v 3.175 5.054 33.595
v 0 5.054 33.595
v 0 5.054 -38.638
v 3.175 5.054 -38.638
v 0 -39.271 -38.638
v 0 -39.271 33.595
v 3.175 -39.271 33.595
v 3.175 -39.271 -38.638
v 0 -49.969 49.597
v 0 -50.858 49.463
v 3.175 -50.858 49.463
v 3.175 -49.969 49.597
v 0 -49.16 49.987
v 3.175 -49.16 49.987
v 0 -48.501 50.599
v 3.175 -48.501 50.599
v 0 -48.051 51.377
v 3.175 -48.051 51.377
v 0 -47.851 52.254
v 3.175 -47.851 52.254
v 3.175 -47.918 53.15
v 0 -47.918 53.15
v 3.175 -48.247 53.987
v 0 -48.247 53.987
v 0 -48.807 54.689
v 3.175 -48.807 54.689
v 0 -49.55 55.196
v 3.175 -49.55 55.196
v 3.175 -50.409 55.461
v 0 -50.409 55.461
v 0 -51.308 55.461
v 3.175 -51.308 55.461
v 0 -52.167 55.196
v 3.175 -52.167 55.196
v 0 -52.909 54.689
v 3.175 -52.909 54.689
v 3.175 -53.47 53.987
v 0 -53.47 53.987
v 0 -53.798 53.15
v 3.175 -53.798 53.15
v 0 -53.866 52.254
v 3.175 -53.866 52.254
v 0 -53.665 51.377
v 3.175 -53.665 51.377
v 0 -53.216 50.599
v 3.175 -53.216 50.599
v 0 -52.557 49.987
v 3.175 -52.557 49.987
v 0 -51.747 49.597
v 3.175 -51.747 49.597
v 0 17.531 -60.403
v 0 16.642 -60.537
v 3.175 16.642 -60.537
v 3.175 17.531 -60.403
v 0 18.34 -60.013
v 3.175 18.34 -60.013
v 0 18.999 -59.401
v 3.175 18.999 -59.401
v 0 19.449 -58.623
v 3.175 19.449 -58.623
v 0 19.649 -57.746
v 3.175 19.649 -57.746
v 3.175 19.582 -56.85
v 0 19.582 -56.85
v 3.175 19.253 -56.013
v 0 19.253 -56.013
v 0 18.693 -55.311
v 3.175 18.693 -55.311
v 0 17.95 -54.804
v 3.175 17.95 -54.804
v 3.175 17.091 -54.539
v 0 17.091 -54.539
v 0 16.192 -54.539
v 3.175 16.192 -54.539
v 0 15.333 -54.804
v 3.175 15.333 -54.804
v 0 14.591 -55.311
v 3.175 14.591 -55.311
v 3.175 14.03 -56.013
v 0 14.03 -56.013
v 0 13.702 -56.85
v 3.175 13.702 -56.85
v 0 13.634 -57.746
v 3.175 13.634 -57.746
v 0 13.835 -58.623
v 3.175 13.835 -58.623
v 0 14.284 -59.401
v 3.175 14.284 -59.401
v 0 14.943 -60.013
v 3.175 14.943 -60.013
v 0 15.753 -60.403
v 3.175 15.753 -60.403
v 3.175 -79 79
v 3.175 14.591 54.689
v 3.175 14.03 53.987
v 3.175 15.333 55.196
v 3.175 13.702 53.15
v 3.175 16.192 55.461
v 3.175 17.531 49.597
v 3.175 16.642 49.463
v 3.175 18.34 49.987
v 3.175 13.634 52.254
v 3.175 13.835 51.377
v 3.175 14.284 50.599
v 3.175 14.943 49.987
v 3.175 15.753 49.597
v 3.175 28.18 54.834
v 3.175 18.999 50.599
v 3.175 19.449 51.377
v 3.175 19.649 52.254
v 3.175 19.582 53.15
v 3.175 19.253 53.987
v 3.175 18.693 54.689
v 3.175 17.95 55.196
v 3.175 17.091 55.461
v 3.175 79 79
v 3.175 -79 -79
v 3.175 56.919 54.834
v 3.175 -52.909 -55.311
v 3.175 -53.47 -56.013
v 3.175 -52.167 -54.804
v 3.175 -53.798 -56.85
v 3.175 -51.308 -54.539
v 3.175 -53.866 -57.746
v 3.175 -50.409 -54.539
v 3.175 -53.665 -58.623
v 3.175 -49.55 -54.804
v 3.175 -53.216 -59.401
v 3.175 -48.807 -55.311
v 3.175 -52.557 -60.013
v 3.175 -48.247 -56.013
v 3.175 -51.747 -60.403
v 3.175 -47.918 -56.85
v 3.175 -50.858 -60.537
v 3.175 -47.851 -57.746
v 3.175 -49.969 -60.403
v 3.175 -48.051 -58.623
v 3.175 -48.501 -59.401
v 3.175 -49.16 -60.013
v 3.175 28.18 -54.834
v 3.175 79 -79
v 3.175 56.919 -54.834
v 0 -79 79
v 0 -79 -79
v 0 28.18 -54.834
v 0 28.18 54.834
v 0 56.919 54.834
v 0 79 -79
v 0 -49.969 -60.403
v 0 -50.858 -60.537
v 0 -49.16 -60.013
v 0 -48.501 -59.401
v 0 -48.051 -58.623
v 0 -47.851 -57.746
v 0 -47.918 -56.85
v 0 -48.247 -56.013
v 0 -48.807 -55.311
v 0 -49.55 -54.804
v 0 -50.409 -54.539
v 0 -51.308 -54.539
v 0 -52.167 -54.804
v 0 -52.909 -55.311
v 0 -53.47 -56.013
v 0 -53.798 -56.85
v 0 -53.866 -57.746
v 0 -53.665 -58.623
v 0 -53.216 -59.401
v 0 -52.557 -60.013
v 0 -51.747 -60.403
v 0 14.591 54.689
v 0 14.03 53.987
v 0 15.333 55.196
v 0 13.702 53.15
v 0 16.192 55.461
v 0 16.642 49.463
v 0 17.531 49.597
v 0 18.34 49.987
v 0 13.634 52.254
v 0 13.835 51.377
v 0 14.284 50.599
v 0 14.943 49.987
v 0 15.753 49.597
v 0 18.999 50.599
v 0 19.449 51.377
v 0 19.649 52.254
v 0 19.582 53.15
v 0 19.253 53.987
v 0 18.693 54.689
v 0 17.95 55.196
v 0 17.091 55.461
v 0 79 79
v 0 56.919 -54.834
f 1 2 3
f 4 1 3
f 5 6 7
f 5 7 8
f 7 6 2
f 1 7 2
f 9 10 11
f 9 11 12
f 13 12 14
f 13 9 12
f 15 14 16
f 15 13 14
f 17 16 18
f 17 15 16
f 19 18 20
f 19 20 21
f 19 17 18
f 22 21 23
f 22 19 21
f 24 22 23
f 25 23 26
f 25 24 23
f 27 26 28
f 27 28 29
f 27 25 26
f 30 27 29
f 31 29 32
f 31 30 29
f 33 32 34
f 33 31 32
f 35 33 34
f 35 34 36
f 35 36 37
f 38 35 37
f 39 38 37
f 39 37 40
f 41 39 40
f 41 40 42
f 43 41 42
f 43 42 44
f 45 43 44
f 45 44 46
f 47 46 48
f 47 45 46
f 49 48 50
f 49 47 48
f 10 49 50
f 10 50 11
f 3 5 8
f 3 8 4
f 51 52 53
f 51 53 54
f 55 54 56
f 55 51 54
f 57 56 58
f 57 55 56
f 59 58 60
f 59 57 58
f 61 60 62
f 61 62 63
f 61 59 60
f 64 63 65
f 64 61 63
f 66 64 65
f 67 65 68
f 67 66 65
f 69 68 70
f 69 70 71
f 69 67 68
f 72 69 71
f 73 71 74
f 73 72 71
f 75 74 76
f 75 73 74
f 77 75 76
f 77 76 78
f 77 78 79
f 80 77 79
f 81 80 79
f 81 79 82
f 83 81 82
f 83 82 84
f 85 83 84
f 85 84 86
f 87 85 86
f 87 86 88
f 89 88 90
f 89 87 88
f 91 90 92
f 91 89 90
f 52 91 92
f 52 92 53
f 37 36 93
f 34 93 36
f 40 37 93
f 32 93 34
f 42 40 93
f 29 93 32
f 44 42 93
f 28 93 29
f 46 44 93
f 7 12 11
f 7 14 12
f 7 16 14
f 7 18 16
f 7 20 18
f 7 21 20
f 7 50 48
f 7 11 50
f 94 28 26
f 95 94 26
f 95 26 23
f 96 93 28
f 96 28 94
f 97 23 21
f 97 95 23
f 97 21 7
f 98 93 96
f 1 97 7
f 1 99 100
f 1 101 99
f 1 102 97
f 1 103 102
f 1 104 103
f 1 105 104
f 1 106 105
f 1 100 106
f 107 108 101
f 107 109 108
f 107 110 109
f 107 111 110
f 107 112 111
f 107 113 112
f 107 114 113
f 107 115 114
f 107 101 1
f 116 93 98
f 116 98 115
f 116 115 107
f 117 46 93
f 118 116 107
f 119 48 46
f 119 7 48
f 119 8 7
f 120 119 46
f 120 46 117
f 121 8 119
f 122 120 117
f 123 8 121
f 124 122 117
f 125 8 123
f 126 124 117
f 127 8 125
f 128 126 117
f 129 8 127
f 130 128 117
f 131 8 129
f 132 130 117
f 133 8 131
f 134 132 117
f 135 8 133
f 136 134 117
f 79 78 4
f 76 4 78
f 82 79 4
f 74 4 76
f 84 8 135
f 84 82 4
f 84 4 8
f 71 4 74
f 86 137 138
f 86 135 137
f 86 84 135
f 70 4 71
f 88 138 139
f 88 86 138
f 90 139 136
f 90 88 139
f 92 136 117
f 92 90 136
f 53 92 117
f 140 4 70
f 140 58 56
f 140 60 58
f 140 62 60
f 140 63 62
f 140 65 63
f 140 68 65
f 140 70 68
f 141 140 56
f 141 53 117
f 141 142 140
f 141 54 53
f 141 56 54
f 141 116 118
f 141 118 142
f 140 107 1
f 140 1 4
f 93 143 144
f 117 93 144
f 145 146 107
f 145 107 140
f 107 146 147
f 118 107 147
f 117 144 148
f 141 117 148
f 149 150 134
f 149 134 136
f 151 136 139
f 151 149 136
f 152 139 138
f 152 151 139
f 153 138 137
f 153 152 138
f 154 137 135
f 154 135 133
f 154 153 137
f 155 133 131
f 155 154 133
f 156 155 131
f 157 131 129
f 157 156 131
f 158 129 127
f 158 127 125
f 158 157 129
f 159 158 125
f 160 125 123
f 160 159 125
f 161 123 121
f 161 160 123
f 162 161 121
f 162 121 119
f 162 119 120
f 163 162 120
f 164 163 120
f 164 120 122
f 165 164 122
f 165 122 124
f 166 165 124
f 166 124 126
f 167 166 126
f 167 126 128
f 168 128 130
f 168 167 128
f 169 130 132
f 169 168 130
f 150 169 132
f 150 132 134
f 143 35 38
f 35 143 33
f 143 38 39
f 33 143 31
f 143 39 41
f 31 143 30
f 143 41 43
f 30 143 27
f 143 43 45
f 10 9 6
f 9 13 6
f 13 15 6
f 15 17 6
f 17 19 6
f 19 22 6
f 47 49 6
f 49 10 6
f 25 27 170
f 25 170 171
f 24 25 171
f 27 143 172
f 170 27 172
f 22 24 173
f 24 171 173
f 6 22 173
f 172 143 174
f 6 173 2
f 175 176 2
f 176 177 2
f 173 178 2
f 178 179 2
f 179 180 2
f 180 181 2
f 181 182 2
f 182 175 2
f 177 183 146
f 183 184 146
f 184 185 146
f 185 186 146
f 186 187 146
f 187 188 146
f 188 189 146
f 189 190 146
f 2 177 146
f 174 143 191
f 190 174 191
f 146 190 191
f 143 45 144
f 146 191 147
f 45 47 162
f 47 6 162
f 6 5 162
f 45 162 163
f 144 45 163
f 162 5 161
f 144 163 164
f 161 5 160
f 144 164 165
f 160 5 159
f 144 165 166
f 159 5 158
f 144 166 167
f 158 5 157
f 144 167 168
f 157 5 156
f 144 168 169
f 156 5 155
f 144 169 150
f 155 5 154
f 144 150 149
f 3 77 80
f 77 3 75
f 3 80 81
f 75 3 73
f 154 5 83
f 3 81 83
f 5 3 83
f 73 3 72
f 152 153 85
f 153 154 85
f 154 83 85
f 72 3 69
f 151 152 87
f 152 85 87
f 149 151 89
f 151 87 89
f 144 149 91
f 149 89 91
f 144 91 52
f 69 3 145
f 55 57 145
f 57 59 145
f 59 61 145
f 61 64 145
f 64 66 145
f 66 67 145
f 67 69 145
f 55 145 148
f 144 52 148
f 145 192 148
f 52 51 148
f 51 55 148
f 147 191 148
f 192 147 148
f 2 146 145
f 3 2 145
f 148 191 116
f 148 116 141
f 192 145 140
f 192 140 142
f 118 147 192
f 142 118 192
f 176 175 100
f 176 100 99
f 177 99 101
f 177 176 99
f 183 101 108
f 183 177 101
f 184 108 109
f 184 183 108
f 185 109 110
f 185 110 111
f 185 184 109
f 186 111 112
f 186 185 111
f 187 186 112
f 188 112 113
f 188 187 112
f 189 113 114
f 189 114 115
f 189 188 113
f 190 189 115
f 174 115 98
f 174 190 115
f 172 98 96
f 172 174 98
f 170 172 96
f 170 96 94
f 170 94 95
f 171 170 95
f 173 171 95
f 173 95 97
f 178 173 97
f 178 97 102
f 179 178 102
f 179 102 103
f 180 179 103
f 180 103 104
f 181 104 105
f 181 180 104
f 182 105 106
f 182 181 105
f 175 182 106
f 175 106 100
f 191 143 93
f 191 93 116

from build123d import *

# Parameters (mm, degrees)
SKETCH1_W           = 158
SKETCH1_H           = 158
SKETCH1_R           = 3.015623361
SKETCH1_W_2         = 109.668996446
SKETCH1_H_2         = 28.739233449
SKETCH1_W_3         = 72.233228696
SKETCH1_H_3         = 44.324935791
BOSS_EXTRUDE1_DEPTH = 3.175


with BuildPart() as part:
    # Sketch1 → Boss-Extrude1 (new body)
    with BuildSketch(Plane(origin=(0, 0, 0), x_dir=(0, 0, -1), z_dir=(1, 0, 0))):
        Rectangle(SKETCH1_W, SKETCH1_H)
        with Locations((-52.478878223, 16.641690282)):
            Circle(SKETCH1_R, mode=Mode.SUBTRACT)
        with Locations((57.521121777, 16.641690282)):
            Circle(SKETCH1_R, mode=Mode.SUBTRACT)
        with Locations((57.521121777, -50.858309718)):
            Circle(SKETCH1_R, mode=Mode.SUBTRACT)
        with Locations((-52.478878223, -50.858309718)):
            Circle(SKETCH1_R, mode=Mode.SUBTRACT)
        with Locations((0, 42.549463737)):
            Rectangle(SKETCH1_W_2, SKETCH1_H_2, mode=Mode.SUBTRACT)
        with Locations((2.521121777, -17.108309717)):
            Rectangle(SKETCH1_W_3, SKETCH1_H_3, mode=Mode.SUBTRACT)
    extrude(amount=BOSS_EXTRUDE1_DEPTH)


solid = part.part
